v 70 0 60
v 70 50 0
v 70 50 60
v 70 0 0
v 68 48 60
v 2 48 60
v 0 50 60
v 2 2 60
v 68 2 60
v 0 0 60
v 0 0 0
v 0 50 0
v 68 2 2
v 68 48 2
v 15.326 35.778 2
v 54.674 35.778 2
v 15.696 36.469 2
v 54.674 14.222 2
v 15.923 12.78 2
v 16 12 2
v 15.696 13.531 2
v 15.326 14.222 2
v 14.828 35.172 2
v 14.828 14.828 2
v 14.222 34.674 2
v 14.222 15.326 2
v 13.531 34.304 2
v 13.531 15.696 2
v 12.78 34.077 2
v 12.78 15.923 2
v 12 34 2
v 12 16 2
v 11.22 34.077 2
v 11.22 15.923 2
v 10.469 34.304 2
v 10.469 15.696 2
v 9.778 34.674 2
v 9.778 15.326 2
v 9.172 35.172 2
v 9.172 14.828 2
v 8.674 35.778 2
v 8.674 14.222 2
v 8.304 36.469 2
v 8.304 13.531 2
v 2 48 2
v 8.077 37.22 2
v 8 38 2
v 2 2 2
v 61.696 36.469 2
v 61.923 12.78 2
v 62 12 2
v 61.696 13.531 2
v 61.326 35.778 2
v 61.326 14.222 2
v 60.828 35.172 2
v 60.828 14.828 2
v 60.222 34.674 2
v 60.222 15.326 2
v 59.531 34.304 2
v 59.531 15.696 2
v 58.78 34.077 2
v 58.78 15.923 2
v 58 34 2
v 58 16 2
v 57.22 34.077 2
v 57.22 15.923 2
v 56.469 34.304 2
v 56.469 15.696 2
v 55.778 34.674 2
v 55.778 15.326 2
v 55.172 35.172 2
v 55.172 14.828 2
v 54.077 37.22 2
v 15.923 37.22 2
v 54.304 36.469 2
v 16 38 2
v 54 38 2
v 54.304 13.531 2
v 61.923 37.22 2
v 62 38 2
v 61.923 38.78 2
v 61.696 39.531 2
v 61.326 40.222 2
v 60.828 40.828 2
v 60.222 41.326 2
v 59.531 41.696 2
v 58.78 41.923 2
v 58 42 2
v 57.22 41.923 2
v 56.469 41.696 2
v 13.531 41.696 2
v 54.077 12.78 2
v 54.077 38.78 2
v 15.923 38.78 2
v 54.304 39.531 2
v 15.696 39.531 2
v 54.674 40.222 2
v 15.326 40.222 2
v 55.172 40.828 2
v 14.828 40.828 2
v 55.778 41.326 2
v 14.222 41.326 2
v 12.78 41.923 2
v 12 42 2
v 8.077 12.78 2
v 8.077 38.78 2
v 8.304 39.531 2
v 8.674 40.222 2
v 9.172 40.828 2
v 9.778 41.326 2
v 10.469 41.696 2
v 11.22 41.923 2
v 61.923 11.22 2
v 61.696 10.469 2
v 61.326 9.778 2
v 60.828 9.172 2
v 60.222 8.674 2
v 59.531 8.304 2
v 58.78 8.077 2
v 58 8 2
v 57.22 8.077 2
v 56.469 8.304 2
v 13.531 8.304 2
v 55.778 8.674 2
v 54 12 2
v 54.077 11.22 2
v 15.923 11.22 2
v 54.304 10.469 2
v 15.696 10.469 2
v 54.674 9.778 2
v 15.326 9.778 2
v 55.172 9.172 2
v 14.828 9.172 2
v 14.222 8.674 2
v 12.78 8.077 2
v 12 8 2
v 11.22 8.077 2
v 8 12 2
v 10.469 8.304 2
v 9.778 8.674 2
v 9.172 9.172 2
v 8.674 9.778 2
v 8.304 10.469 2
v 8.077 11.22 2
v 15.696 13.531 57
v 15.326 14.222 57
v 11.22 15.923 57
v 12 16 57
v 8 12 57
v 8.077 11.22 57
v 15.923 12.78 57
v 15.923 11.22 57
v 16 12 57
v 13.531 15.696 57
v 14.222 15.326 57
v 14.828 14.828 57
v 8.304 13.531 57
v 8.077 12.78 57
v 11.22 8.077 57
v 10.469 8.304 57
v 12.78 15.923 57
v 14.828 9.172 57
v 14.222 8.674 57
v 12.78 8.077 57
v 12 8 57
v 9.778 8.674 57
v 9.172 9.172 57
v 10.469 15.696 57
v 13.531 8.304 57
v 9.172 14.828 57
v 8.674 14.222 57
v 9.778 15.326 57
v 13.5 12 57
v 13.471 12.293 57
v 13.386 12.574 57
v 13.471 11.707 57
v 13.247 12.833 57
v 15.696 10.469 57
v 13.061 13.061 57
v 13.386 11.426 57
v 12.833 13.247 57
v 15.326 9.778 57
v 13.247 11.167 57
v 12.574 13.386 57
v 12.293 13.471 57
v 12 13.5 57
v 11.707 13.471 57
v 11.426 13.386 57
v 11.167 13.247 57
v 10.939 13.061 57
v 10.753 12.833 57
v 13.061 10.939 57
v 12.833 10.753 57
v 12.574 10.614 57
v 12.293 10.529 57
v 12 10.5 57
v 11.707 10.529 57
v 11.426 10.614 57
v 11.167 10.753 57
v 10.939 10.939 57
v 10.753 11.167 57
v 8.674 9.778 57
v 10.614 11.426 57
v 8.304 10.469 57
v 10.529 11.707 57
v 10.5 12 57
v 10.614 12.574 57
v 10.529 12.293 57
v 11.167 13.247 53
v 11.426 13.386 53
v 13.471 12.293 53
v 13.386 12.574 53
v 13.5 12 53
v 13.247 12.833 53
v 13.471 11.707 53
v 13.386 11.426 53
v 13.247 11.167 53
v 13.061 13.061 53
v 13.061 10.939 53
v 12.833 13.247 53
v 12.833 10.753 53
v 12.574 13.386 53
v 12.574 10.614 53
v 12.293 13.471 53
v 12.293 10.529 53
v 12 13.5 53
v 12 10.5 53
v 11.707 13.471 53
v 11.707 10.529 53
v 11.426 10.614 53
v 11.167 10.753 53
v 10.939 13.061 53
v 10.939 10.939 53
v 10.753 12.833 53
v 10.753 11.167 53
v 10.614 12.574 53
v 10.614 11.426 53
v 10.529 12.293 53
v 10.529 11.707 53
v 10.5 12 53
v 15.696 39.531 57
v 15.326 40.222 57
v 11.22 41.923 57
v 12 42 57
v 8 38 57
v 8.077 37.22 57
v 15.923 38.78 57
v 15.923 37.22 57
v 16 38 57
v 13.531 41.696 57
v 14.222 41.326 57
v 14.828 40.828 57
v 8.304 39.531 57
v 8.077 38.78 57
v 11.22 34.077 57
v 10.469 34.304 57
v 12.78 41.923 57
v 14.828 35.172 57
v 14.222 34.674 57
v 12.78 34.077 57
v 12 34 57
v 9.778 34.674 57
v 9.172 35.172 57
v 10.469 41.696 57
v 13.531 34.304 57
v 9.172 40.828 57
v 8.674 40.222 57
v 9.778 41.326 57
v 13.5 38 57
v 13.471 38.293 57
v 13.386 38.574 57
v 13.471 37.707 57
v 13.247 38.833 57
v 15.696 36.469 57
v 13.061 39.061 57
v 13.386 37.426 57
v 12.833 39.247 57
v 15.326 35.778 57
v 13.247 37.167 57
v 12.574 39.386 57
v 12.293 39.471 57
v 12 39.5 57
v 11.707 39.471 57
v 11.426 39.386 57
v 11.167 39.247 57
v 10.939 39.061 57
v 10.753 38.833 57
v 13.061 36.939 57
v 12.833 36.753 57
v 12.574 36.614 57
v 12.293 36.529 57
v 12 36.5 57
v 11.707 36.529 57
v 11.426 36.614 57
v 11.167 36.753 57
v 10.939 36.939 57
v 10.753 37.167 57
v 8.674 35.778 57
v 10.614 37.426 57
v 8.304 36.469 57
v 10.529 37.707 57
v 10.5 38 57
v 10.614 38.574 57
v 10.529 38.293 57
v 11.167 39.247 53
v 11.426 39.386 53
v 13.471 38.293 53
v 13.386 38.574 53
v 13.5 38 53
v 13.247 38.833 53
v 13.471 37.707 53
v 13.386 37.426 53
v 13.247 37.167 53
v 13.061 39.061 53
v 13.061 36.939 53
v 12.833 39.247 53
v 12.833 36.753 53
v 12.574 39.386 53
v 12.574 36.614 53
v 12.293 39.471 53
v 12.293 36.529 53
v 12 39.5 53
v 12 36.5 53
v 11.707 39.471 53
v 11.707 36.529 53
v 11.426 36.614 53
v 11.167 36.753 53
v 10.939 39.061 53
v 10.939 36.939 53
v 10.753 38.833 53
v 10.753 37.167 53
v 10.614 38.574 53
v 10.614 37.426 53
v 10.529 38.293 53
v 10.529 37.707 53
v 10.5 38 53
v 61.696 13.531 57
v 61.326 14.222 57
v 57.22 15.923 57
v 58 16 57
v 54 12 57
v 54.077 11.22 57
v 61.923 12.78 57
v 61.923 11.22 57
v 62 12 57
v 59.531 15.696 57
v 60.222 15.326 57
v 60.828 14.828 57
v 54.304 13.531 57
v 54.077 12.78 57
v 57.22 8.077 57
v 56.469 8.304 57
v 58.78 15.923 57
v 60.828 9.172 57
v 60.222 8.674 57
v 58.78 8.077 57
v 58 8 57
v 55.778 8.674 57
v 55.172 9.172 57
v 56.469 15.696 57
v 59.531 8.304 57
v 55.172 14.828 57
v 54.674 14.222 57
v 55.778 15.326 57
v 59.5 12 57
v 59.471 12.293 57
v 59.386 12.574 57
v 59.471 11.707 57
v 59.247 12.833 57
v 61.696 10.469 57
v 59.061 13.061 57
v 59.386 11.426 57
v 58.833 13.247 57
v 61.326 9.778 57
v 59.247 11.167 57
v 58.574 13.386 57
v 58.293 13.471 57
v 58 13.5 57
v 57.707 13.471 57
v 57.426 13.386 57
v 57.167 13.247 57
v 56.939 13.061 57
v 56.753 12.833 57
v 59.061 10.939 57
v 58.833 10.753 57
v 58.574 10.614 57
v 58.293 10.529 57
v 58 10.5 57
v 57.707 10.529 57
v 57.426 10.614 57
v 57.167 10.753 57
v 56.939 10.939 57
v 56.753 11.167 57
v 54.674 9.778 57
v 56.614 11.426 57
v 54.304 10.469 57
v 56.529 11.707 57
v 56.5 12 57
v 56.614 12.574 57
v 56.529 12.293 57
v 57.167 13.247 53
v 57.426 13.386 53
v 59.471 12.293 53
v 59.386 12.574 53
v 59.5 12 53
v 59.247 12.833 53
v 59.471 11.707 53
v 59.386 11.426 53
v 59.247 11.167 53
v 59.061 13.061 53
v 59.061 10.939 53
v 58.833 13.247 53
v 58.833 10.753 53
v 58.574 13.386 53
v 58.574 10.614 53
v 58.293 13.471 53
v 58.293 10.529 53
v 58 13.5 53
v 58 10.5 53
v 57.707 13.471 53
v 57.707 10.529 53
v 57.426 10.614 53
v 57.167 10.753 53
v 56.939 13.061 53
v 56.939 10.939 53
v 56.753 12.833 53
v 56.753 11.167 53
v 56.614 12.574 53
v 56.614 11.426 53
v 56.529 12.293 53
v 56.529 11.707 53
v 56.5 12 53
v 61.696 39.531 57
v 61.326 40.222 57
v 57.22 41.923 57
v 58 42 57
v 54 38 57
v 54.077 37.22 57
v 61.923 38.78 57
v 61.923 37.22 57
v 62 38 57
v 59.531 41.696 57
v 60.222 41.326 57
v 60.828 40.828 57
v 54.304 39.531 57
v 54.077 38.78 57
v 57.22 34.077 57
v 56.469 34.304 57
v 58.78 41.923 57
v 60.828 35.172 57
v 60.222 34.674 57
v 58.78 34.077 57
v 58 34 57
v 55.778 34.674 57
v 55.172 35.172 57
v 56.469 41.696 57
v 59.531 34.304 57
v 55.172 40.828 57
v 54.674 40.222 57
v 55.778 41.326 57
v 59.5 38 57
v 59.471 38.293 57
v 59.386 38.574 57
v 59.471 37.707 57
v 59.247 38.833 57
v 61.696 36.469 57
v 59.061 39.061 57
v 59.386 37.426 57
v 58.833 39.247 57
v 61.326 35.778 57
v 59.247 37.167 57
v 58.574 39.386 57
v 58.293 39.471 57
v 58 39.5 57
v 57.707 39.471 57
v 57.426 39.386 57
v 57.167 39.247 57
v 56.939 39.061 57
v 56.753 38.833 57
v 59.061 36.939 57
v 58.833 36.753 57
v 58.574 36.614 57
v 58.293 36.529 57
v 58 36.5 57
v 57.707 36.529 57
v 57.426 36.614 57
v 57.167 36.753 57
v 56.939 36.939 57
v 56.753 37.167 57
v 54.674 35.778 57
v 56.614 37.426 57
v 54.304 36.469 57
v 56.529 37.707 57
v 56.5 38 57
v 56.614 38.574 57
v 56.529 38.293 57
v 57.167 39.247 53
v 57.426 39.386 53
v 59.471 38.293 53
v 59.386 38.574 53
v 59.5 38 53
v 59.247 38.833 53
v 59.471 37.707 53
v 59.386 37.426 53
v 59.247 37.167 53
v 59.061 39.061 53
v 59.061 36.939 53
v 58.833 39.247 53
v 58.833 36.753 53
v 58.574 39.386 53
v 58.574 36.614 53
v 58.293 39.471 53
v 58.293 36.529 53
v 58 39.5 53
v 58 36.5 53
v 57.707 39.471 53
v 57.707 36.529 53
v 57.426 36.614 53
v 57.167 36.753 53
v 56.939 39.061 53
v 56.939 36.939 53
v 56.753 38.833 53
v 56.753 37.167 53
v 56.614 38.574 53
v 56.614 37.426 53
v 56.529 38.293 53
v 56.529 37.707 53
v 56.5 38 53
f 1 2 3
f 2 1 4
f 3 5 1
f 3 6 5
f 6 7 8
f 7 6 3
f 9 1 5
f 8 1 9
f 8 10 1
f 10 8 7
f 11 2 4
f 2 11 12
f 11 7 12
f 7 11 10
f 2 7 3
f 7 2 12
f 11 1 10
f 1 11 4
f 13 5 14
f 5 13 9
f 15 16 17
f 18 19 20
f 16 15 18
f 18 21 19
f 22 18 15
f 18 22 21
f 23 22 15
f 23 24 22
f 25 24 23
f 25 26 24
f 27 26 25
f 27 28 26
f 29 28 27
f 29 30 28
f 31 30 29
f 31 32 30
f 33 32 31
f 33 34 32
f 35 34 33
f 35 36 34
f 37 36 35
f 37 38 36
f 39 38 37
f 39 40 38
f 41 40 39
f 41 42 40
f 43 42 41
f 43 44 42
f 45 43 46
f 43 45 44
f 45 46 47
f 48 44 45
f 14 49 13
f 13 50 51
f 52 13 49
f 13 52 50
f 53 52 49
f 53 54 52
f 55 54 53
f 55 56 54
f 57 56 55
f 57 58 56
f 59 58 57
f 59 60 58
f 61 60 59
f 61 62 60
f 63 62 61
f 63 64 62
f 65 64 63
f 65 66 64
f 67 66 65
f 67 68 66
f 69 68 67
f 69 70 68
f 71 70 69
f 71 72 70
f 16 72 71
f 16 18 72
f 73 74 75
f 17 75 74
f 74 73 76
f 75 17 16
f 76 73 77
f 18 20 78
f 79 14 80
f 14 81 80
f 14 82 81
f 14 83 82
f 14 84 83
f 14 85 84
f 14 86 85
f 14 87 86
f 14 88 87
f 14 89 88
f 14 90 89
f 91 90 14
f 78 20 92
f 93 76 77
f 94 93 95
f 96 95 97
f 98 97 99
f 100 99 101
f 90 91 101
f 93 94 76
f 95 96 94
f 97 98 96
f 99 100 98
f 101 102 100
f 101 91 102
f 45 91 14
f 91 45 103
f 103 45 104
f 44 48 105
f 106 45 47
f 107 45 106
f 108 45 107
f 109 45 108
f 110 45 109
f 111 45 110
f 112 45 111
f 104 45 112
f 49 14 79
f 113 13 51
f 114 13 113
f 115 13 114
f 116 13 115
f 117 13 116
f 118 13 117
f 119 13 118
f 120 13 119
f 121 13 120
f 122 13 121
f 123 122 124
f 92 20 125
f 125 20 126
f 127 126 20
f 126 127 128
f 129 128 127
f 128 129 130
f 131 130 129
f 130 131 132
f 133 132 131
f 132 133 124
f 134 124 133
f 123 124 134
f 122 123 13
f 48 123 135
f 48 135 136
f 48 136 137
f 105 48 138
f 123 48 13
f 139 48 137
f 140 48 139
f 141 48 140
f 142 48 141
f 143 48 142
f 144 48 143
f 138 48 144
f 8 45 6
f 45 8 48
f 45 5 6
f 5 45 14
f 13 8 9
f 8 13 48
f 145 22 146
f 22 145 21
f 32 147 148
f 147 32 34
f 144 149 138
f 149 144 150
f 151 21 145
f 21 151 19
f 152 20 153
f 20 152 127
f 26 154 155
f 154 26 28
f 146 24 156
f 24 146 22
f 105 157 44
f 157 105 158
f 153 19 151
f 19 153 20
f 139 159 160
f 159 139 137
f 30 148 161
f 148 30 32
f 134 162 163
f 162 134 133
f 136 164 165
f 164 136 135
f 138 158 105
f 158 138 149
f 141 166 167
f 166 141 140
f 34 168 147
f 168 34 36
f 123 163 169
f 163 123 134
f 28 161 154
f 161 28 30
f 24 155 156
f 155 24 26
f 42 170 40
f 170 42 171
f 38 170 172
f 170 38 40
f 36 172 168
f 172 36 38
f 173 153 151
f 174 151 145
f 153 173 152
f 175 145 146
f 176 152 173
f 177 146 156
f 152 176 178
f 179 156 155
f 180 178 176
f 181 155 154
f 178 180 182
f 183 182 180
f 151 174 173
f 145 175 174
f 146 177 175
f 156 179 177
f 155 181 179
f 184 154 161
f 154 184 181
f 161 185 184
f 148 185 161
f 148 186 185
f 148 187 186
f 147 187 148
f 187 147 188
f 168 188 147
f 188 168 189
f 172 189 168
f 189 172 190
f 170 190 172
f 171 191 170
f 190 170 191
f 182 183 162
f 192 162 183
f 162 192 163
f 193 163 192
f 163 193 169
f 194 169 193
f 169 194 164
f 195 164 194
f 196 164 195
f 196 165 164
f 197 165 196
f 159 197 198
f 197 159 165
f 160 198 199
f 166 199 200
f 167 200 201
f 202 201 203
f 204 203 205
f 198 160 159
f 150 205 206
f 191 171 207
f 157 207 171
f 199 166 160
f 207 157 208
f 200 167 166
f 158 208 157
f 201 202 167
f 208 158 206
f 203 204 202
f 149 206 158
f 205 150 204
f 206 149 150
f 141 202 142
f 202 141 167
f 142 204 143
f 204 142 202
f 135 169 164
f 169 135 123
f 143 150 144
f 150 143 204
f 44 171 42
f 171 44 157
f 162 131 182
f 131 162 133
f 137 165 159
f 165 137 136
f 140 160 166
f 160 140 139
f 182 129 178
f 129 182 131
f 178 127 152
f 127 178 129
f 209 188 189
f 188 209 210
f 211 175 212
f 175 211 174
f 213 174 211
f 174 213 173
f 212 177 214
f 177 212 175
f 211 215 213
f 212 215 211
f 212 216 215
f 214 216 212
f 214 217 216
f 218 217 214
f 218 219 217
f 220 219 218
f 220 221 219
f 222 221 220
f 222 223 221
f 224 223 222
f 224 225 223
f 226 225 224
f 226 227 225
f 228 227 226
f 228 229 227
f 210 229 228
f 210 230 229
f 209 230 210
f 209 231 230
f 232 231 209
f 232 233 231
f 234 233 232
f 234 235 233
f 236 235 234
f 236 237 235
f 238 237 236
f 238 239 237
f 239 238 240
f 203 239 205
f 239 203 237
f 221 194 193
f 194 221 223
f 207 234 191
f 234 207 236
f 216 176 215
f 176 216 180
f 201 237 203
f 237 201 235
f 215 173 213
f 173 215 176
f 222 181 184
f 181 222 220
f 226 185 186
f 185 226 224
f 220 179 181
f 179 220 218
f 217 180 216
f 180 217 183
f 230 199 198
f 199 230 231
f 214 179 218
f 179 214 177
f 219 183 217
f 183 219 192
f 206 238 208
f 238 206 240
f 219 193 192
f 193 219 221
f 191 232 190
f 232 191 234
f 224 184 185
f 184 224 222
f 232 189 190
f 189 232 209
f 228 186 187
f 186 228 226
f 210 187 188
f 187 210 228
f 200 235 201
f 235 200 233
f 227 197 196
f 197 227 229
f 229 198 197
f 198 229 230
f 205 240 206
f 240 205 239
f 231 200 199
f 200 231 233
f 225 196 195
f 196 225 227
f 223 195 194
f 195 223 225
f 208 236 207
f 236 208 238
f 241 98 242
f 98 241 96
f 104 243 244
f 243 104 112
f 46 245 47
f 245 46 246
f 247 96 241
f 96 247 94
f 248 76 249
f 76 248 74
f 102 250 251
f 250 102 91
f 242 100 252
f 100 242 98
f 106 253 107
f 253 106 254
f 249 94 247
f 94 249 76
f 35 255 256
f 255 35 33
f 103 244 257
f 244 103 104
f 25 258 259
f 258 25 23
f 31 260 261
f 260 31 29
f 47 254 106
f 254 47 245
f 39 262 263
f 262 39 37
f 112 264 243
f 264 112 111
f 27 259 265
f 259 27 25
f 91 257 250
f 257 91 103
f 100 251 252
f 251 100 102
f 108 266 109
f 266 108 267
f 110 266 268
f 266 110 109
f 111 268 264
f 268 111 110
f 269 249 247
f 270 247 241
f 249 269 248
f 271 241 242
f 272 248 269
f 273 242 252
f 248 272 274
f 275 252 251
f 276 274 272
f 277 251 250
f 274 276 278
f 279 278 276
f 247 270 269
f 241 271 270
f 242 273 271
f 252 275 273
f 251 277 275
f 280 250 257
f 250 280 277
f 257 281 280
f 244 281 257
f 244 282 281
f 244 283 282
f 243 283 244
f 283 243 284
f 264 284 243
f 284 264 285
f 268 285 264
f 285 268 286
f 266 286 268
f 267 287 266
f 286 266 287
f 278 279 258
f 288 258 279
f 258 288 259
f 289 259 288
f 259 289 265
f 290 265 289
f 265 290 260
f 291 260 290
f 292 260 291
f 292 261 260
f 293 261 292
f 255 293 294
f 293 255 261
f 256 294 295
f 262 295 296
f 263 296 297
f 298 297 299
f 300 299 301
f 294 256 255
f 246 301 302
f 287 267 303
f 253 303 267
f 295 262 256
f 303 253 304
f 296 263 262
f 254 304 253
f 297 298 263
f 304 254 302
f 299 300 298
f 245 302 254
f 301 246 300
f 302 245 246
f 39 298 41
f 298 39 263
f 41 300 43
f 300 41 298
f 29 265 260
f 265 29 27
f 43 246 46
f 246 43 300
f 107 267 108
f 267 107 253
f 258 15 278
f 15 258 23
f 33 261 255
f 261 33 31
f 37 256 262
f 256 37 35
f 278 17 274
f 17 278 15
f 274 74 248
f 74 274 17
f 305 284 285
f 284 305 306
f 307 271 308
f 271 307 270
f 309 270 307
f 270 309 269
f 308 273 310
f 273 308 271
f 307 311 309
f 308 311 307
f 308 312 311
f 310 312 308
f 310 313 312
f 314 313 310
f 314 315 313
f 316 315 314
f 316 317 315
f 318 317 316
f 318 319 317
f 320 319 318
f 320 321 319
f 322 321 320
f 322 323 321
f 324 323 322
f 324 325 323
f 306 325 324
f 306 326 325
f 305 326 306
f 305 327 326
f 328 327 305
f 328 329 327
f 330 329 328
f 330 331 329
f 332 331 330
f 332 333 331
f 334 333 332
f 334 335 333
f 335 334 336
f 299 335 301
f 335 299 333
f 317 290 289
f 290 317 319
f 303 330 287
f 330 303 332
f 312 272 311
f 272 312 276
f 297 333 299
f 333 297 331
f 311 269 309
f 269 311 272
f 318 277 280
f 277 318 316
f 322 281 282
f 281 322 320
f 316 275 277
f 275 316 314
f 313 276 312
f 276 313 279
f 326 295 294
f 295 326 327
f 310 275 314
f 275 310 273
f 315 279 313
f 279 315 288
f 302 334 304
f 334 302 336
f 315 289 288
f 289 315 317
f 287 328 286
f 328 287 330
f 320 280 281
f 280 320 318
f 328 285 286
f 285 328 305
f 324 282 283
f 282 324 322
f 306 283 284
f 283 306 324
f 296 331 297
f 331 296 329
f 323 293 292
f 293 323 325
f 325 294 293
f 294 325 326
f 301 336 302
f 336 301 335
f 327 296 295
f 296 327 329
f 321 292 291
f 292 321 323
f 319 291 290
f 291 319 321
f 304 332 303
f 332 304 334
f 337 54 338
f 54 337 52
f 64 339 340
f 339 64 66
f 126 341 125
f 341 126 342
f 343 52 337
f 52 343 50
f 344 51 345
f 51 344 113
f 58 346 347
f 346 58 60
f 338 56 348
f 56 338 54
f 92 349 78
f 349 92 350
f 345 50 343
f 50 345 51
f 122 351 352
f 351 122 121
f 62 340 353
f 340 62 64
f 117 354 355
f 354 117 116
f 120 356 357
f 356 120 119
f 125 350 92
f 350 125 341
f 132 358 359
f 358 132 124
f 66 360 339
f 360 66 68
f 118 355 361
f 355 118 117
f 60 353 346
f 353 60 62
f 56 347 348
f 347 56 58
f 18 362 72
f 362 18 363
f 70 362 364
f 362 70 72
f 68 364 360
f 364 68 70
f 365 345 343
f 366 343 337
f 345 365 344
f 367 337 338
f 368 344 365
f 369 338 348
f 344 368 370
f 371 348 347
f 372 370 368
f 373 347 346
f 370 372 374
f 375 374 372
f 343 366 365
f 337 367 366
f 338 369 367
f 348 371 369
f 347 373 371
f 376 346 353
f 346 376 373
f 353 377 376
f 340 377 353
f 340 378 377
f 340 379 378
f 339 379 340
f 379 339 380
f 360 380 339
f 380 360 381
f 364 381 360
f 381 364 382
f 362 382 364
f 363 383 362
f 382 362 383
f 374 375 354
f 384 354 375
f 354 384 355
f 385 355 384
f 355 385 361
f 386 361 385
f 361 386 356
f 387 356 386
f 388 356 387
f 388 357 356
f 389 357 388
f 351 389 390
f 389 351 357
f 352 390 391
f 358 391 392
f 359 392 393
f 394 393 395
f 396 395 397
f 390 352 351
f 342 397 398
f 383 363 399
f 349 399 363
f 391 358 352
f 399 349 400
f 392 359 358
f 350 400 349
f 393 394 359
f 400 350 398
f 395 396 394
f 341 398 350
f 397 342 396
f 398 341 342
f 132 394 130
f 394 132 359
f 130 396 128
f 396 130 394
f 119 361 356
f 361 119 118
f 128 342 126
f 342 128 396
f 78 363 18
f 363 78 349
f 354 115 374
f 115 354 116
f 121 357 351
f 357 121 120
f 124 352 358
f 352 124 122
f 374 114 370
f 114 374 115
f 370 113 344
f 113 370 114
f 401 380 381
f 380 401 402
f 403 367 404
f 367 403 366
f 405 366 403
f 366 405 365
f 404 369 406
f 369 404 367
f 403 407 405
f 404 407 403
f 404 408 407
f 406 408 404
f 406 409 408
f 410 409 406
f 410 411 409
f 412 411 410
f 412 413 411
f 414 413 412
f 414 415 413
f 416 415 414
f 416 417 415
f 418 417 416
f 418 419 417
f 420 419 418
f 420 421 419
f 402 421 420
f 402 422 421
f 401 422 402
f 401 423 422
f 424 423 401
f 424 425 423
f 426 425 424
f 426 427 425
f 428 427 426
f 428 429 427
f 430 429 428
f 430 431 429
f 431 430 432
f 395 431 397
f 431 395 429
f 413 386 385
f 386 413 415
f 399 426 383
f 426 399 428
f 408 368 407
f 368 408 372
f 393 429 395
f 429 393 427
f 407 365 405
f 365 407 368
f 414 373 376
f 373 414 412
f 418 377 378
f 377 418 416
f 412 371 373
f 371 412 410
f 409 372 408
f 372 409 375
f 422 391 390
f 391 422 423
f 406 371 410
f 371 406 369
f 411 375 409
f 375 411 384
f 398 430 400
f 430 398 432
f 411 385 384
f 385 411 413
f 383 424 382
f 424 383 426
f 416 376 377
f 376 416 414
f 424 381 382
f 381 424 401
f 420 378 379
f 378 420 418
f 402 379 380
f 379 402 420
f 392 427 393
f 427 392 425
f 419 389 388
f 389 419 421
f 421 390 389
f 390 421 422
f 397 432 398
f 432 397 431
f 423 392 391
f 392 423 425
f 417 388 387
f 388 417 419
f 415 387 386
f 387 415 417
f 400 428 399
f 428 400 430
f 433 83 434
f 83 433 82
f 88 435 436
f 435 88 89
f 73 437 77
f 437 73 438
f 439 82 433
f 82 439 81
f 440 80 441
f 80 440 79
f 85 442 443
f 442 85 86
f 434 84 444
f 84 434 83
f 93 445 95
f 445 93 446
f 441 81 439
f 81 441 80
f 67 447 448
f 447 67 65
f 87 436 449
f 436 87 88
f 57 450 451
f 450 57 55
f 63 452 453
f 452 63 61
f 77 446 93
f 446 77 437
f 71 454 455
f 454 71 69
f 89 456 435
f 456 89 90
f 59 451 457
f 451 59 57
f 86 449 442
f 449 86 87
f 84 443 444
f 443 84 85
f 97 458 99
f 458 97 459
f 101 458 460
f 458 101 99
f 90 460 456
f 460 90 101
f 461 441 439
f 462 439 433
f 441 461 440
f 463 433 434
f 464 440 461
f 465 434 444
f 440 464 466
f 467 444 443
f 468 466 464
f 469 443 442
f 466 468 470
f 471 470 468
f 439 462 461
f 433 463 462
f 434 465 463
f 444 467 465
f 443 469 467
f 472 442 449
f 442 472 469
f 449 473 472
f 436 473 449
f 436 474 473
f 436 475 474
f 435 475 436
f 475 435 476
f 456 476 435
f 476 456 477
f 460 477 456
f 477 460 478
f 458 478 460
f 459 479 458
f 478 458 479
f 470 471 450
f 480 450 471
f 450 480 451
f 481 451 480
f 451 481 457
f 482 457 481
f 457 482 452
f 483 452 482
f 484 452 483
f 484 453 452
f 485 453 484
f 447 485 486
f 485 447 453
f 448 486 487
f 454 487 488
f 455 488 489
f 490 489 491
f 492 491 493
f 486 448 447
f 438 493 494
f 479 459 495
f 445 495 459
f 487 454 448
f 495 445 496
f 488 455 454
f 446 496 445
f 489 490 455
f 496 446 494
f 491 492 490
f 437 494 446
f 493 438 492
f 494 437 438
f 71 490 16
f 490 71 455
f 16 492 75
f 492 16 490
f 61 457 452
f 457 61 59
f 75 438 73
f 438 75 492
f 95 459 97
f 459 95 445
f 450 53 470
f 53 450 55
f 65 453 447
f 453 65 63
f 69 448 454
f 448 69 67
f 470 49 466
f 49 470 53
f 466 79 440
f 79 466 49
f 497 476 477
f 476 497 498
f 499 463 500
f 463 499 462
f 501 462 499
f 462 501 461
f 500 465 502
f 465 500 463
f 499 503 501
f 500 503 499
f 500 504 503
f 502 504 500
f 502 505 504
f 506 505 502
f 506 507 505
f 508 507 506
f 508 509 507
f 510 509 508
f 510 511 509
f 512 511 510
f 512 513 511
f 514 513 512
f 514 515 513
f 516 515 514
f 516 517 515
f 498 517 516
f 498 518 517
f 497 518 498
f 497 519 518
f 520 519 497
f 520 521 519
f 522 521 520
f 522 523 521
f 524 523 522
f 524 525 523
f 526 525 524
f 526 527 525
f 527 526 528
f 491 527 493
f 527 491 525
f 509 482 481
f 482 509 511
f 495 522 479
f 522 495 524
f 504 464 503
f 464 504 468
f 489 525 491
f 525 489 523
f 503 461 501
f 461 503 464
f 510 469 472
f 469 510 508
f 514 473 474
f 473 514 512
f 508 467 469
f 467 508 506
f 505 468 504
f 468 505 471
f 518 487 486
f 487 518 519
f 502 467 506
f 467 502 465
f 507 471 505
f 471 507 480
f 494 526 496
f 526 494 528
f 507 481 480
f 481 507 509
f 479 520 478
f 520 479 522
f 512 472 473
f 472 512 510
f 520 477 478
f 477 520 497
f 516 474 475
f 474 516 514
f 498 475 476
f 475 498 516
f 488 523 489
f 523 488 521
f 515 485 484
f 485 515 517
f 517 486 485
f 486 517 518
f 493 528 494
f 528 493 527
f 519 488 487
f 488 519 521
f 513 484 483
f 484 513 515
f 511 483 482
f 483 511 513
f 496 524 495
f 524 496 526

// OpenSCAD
$fn = 32;

// ----------------------------------------------------------------------
// Enclosure box: bosses enclosure
// ----------------------------------------------------------------------

// --- parameters (mm) ---
box_l = 70;               // outer length, X
box_w = 50;               // outer width, Y
box_h = 60;               // outer height
wall_t = 2;               // wall thickness
boss_r = 4;               // corner boss radius
hole_r = 1.5;             // boss screw hole radius
boss_in = 12;             // boss inset from the corners

inner_h = box_h - wall_t;  // cavity depth
boss_h = inner_h - 2;  // corner boss height

difference() {
  union() {
    difference() {
      cube([box_l, box_w, box_h]);
      translate([wall_t, wall_t, wall_t])
        cube([box_l - 2 * wall_t, box_w - 2 * wall_t, box_h]);
    }
    for (sx = [0, 1], sy = [0, 1])
      translate([sx ? box_l - boss_in : boss_in,
                 sy ? box_w - boss_in : boss_in, wall_t - 1])
        difference() {
          cylinder(r = boss_r, h = boss_h);
          translate([0, 0, boss_h - 4])
            cylinder(r = hole_r, h = 5);
        }
  }
}
